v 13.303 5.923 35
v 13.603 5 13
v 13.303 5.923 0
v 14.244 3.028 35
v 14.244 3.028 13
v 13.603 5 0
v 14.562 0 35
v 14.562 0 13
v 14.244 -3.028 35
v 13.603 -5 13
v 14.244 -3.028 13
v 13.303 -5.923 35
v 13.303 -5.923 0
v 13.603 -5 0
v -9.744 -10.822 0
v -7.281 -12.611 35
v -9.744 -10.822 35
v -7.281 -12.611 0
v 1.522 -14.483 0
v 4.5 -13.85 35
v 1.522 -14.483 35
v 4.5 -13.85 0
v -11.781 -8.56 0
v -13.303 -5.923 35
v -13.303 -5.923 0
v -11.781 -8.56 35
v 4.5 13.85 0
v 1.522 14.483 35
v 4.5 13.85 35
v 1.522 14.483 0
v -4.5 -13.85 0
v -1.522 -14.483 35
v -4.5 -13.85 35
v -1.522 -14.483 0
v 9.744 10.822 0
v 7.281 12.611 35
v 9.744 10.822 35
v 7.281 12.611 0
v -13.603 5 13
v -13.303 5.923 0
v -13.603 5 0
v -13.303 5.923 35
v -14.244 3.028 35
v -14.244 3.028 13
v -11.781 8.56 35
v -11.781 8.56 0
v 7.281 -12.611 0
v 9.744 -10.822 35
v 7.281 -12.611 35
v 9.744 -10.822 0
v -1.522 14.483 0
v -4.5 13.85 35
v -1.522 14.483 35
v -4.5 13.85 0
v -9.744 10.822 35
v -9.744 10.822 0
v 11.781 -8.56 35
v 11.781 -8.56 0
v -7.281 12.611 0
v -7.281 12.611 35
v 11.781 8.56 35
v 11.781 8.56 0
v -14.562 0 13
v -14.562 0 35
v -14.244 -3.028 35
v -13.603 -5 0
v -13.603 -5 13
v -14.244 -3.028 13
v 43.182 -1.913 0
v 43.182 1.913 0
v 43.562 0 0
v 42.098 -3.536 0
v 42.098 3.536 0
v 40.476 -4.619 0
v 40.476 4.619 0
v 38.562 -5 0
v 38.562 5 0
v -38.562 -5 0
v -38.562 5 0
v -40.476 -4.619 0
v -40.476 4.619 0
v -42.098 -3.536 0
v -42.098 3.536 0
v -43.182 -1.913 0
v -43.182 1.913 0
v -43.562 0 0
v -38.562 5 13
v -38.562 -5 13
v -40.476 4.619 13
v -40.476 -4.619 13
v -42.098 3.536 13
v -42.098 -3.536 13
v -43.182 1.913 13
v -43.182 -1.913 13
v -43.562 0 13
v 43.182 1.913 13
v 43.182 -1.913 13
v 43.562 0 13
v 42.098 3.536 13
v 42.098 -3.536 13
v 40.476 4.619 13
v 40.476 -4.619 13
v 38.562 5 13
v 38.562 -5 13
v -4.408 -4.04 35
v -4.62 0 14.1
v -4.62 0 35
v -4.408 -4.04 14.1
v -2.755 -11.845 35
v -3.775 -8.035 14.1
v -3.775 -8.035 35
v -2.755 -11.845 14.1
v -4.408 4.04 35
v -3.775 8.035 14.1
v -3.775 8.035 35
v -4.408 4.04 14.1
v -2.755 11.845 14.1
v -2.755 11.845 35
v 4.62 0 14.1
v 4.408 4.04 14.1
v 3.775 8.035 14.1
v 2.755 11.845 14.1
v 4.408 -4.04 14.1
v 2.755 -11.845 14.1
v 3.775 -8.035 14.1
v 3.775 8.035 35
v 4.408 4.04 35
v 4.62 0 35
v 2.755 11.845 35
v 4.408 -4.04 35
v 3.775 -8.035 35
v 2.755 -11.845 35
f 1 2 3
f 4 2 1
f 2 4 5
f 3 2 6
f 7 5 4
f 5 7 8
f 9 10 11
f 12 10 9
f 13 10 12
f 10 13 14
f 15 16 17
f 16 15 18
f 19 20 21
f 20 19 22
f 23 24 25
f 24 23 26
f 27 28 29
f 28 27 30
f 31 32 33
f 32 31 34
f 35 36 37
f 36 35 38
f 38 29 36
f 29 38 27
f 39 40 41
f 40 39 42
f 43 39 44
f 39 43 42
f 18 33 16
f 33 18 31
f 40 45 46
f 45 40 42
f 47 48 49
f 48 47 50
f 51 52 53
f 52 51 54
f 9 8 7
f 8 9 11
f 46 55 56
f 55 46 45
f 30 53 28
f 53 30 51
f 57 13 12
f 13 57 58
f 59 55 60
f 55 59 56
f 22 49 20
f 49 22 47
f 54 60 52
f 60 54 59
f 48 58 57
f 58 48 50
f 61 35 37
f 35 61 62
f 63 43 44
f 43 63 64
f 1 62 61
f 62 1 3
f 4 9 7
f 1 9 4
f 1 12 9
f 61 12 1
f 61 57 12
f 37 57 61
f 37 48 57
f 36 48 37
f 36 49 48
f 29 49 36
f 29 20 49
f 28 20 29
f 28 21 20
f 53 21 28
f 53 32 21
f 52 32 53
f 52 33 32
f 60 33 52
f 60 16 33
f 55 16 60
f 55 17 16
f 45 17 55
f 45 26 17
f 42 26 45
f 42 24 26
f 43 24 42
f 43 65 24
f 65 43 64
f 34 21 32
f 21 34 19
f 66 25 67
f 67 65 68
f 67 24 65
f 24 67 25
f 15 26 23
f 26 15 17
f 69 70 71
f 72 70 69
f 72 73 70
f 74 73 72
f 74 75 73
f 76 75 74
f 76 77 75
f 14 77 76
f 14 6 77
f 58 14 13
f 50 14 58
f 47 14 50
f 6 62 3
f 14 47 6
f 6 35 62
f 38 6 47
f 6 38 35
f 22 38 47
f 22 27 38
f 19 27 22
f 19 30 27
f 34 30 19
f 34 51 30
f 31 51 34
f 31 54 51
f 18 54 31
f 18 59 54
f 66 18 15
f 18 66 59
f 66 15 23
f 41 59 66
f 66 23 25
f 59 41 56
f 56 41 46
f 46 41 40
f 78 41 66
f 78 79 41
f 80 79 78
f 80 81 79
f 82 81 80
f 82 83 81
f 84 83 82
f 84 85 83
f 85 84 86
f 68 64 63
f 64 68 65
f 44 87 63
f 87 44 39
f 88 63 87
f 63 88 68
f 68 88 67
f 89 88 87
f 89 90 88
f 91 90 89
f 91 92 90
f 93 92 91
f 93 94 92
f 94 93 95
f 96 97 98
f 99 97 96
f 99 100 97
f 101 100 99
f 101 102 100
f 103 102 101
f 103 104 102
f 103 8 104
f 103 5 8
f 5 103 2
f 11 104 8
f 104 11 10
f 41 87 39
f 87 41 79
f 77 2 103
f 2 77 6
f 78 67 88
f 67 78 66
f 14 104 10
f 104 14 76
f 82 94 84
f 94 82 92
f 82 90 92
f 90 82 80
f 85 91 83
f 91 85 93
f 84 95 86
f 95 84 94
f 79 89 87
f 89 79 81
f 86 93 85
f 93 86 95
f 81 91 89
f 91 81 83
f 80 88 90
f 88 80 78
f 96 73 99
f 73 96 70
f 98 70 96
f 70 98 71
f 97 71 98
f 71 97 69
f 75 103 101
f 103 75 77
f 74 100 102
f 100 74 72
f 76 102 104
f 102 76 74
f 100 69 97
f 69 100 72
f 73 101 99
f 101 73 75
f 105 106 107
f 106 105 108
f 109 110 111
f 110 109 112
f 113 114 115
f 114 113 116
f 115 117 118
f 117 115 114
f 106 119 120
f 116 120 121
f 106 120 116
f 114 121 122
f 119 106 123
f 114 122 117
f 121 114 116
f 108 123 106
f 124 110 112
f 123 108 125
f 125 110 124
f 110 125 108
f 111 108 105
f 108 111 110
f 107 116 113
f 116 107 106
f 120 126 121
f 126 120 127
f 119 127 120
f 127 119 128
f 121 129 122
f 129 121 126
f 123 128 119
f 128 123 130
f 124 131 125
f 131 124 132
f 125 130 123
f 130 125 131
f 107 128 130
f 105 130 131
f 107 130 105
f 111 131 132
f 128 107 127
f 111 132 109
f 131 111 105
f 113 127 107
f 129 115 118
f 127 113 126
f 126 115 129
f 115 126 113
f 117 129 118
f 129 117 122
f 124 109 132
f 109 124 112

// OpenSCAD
cylinder_height = 35;
wall_thickness = 2.4;

handle_height = 13;
handle_length = 24;
handle_thickness = 10;

hole_desired_height = 20.4;
hole_desired_width = 22.69;
hole_desired_middle_thickness = 8.24;
hole_desired_outer_thickness = 4.52;

tolerance = 0.5;

hole_height = hole_desired_height + tolerance;
hole_width = hole_desired_width + 2*tolerance;
hole_middle_thickness = hole_desired_middle_thickness + 2*tolerance;
hole_outer_thickness = hole_desired_outer_thickness + 2*tolerance;

cylinder_radius = wall_thickness + sqrt(pow(hole_outer_thickness / 2,2) +pow(hole_width/2,2));

nudge = 0.01;

module main() {
    cylinder(h=cylinder_height, r=cylinder_radius);
    translate([-handle_length-cylinder_radius,-handle_thickness/2,0]) cube([2*handle_length+2*cylinder_radius,handle_thickness,handle_height]);
    translate([-handle_length-cylinder_radius,0,0]) cylinder(h=handle_height, d=handle_thickness);
    translate([handle_length+cylinder_radius,0,0]) cylinder(h=handle_height, d=handle_thickness);
}

module hole() {
    delta = (hole_middle_thickness - hole_outer_thickness)/2;
    a = hole_width / 2;
    r = (a*a+delta*delta)/(2*delta);
    render(convexity=5)
    translate([0,0,cylinder_height-hole_height]) 
    intersection() {
    translate([r-delta-hole_outer_thickness/2,0,0]) cylinder(r=r, h=hole_height+nudge,$fn=60);
    translate([-r+delta+hole_outer_thickness/2,0,0]) cylinder(r=r, h=hole_height+nudge,$fn=60);
    translate([0,0,hole_height/2]) cube(center=true,[hole_middle_thickness,hole_width,hole_height]);
    }
}

difference() {
    main();
    hole();
}
